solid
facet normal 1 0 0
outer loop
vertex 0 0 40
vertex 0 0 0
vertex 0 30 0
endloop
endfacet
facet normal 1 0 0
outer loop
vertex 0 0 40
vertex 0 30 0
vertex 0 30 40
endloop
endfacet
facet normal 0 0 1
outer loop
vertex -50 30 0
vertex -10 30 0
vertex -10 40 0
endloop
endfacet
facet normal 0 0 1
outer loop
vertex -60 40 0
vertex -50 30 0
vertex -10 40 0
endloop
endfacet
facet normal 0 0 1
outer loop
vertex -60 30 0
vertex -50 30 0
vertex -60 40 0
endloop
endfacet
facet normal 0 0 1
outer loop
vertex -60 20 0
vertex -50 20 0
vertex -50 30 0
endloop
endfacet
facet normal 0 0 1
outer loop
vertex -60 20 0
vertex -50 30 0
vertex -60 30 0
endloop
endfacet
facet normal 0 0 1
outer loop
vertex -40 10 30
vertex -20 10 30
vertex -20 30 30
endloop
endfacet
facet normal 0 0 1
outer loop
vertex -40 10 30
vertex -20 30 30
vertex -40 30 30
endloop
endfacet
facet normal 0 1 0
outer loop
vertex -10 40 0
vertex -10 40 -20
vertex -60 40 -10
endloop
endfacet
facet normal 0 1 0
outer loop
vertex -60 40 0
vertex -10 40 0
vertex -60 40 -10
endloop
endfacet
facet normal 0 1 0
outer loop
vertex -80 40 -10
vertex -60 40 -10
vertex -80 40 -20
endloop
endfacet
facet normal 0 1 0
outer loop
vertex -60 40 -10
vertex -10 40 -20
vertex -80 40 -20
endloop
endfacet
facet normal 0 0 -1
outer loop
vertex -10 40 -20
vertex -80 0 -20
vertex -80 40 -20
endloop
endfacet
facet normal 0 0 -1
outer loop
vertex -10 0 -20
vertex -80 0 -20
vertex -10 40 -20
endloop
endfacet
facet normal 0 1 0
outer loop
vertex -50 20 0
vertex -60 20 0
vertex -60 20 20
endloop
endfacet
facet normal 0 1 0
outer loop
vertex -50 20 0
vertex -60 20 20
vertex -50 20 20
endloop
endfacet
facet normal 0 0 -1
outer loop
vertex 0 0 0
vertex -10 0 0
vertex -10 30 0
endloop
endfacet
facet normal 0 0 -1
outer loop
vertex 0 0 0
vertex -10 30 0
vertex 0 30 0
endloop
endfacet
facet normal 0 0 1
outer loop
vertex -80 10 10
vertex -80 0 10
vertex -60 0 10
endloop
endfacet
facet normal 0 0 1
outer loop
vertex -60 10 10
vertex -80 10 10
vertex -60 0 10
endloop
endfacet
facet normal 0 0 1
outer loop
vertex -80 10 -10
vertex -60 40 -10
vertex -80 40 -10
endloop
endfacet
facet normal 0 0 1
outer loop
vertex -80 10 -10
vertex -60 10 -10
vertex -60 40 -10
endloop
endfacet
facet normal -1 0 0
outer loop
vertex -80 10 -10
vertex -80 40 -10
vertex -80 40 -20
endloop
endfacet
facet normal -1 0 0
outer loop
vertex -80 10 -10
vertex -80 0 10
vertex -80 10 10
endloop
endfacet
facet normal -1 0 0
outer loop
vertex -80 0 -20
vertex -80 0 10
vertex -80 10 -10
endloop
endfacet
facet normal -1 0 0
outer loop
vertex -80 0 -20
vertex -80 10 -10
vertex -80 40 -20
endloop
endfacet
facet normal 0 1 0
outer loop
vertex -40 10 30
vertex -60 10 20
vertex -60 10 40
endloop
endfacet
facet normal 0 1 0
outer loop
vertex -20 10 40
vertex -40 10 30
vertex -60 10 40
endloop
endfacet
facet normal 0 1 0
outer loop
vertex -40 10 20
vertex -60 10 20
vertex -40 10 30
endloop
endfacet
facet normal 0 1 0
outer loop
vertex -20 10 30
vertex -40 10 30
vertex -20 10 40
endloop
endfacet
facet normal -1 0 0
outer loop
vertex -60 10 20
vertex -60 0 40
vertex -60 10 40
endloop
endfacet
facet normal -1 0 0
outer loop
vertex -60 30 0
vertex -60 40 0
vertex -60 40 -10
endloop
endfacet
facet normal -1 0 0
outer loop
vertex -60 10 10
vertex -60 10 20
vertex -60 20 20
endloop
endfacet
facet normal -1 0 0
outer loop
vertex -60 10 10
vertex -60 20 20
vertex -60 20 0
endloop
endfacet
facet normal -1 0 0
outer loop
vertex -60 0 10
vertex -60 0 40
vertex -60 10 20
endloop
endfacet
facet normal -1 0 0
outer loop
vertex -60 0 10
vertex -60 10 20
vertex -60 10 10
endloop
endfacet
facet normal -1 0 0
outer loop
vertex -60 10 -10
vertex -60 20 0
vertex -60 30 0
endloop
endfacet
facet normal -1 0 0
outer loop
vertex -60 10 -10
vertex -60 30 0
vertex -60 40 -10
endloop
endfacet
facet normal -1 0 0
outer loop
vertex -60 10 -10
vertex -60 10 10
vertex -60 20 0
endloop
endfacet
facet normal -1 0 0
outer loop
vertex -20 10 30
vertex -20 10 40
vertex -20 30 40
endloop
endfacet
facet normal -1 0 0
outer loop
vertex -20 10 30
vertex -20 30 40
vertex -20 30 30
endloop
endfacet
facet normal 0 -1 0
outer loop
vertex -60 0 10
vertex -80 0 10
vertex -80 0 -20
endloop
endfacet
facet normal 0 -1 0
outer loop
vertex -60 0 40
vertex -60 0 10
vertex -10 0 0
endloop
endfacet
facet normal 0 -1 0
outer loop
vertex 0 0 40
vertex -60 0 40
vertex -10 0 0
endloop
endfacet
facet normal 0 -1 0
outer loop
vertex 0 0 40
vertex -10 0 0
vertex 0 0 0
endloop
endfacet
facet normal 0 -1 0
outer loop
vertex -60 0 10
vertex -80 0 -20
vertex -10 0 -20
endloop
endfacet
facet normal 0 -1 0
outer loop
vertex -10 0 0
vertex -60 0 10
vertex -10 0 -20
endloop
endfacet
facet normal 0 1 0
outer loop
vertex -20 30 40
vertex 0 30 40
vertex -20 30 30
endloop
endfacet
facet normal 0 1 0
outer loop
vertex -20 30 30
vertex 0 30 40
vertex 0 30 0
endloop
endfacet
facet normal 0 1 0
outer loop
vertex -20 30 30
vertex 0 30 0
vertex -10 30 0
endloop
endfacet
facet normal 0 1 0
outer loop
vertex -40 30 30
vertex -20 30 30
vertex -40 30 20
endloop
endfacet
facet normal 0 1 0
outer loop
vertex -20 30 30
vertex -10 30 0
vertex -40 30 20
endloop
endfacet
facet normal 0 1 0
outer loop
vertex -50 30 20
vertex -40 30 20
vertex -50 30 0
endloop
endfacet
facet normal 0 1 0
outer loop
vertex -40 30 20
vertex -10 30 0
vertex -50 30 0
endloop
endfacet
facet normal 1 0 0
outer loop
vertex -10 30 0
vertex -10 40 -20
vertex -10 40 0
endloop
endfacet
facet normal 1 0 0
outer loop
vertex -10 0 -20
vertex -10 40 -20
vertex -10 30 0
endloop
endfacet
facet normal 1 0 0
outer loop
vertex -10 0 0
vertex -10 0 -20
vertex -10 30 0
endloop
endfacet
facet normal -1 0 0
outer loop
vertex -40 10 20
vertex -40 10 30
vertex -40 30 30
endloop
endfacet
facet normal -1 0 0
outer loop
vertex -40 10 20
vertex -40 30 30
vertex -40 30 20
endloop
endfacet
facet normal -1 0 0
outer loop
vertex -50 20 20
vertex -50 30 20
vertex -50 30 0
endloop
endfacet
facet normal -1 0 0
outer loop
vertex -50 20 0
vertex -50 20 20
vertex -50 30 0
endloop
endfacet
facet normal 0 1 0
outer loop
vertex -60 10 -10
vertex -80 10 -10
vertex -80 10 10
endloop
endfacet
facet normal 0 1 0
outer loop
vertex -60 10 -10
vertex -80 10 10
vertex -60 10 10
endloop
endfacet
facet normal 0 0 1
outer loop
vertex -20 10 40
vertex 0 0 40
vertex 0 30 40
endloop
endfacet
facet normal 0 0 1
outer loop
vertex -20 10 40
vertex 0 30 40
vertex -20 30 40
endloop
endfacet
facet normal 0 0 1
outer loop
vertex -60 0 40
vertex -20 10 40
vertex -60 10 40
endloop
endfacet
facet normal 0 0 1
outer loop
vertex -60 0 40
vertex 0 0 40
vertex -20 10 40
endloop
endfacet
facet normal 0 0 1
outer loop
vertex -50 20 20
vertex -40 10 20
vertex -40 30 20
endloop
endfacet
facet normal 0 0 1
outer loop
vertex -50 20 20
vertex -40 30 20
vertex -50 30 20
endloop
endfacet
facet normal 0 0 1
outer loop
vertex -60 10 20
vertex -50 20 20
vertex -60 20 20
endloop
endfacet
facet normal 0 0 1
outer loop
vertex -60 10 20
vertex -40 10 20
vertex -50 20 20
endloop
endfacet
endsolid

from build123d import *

# Parameters (mm, degrees)
BOSS_EXTRUDE1_DEPTH = 10
BOSS_EXTRUDE2_DEPTH = 20
BOSS_EXTRUDE3_DEPTH = 10
SKETCH4_W           = 10
SKETCH4_H           = 26.291217747
CUT_EXTRUDE1_DEPTH  = 10


with BuildPart() as part:
    # Sketch1 → Boss-Extrude1 (new body)
    with BuildSketch(Plane(origin=(0, 0, 0), x_dir=(1, 0, 0), z_dir=(0, 1, 0))):
        Polygon((0, 0), (-10, 0), (-10, 20), (-80, 20), (-80, -10), (-60, -10), (-60, -40), (0, -40), align=None)
    extrude(amount=BOSS_EXTRUDE1_DEPTH)

    # Sketch2 → Boss-Extrude2 (add)
    with BuildSketch(Plane(origin=(0, 10, 0), x_dir=(1, 0, 0), z_dir=(0, 1, 0))):
        Polygon((-10, 20), (-10, 0), (0, 0), (0, -40), (-20, -40), (-20, -30), (-40, -30), (-40, -20), (-60, -20), (-60, -10), (-60, 10), (-80, 10), (-80, 20), (-60, 20), align=None)
    extrude(amount=BOSS_EXTRUDE2_DEPTH)

    # Sketch3 → Boss-Extrude3 (add)
    with BuildSketch(Plane(origin=(0, 30, 0), x_dir=(1, 0, 0), z_dir=(0, 1, 0))):
        Polygon((-80, 20), (-10, 20), (-10, 0), (-60, 0), (-60, 10), (-80, 10), align=None)
    extrude(amount=BOSS_EXTRUDE3_DEPTH)

    # Sketch4 → Cut-Extrude1 (cut)
    with BuildSketch(Plane(origin=(0, 30, 0), x_dir=(1, 0, 0), z_dir=(0, 1, 0))):
        with Locations((-55, -13.145608874)):
            Rectangle(SKETCH4_W, SKETCH4_H)
    extrude(amount=-CUT_EXTRUDE1_DEPTH, mode=Mode.SUBTRACT)


solid = part.part
